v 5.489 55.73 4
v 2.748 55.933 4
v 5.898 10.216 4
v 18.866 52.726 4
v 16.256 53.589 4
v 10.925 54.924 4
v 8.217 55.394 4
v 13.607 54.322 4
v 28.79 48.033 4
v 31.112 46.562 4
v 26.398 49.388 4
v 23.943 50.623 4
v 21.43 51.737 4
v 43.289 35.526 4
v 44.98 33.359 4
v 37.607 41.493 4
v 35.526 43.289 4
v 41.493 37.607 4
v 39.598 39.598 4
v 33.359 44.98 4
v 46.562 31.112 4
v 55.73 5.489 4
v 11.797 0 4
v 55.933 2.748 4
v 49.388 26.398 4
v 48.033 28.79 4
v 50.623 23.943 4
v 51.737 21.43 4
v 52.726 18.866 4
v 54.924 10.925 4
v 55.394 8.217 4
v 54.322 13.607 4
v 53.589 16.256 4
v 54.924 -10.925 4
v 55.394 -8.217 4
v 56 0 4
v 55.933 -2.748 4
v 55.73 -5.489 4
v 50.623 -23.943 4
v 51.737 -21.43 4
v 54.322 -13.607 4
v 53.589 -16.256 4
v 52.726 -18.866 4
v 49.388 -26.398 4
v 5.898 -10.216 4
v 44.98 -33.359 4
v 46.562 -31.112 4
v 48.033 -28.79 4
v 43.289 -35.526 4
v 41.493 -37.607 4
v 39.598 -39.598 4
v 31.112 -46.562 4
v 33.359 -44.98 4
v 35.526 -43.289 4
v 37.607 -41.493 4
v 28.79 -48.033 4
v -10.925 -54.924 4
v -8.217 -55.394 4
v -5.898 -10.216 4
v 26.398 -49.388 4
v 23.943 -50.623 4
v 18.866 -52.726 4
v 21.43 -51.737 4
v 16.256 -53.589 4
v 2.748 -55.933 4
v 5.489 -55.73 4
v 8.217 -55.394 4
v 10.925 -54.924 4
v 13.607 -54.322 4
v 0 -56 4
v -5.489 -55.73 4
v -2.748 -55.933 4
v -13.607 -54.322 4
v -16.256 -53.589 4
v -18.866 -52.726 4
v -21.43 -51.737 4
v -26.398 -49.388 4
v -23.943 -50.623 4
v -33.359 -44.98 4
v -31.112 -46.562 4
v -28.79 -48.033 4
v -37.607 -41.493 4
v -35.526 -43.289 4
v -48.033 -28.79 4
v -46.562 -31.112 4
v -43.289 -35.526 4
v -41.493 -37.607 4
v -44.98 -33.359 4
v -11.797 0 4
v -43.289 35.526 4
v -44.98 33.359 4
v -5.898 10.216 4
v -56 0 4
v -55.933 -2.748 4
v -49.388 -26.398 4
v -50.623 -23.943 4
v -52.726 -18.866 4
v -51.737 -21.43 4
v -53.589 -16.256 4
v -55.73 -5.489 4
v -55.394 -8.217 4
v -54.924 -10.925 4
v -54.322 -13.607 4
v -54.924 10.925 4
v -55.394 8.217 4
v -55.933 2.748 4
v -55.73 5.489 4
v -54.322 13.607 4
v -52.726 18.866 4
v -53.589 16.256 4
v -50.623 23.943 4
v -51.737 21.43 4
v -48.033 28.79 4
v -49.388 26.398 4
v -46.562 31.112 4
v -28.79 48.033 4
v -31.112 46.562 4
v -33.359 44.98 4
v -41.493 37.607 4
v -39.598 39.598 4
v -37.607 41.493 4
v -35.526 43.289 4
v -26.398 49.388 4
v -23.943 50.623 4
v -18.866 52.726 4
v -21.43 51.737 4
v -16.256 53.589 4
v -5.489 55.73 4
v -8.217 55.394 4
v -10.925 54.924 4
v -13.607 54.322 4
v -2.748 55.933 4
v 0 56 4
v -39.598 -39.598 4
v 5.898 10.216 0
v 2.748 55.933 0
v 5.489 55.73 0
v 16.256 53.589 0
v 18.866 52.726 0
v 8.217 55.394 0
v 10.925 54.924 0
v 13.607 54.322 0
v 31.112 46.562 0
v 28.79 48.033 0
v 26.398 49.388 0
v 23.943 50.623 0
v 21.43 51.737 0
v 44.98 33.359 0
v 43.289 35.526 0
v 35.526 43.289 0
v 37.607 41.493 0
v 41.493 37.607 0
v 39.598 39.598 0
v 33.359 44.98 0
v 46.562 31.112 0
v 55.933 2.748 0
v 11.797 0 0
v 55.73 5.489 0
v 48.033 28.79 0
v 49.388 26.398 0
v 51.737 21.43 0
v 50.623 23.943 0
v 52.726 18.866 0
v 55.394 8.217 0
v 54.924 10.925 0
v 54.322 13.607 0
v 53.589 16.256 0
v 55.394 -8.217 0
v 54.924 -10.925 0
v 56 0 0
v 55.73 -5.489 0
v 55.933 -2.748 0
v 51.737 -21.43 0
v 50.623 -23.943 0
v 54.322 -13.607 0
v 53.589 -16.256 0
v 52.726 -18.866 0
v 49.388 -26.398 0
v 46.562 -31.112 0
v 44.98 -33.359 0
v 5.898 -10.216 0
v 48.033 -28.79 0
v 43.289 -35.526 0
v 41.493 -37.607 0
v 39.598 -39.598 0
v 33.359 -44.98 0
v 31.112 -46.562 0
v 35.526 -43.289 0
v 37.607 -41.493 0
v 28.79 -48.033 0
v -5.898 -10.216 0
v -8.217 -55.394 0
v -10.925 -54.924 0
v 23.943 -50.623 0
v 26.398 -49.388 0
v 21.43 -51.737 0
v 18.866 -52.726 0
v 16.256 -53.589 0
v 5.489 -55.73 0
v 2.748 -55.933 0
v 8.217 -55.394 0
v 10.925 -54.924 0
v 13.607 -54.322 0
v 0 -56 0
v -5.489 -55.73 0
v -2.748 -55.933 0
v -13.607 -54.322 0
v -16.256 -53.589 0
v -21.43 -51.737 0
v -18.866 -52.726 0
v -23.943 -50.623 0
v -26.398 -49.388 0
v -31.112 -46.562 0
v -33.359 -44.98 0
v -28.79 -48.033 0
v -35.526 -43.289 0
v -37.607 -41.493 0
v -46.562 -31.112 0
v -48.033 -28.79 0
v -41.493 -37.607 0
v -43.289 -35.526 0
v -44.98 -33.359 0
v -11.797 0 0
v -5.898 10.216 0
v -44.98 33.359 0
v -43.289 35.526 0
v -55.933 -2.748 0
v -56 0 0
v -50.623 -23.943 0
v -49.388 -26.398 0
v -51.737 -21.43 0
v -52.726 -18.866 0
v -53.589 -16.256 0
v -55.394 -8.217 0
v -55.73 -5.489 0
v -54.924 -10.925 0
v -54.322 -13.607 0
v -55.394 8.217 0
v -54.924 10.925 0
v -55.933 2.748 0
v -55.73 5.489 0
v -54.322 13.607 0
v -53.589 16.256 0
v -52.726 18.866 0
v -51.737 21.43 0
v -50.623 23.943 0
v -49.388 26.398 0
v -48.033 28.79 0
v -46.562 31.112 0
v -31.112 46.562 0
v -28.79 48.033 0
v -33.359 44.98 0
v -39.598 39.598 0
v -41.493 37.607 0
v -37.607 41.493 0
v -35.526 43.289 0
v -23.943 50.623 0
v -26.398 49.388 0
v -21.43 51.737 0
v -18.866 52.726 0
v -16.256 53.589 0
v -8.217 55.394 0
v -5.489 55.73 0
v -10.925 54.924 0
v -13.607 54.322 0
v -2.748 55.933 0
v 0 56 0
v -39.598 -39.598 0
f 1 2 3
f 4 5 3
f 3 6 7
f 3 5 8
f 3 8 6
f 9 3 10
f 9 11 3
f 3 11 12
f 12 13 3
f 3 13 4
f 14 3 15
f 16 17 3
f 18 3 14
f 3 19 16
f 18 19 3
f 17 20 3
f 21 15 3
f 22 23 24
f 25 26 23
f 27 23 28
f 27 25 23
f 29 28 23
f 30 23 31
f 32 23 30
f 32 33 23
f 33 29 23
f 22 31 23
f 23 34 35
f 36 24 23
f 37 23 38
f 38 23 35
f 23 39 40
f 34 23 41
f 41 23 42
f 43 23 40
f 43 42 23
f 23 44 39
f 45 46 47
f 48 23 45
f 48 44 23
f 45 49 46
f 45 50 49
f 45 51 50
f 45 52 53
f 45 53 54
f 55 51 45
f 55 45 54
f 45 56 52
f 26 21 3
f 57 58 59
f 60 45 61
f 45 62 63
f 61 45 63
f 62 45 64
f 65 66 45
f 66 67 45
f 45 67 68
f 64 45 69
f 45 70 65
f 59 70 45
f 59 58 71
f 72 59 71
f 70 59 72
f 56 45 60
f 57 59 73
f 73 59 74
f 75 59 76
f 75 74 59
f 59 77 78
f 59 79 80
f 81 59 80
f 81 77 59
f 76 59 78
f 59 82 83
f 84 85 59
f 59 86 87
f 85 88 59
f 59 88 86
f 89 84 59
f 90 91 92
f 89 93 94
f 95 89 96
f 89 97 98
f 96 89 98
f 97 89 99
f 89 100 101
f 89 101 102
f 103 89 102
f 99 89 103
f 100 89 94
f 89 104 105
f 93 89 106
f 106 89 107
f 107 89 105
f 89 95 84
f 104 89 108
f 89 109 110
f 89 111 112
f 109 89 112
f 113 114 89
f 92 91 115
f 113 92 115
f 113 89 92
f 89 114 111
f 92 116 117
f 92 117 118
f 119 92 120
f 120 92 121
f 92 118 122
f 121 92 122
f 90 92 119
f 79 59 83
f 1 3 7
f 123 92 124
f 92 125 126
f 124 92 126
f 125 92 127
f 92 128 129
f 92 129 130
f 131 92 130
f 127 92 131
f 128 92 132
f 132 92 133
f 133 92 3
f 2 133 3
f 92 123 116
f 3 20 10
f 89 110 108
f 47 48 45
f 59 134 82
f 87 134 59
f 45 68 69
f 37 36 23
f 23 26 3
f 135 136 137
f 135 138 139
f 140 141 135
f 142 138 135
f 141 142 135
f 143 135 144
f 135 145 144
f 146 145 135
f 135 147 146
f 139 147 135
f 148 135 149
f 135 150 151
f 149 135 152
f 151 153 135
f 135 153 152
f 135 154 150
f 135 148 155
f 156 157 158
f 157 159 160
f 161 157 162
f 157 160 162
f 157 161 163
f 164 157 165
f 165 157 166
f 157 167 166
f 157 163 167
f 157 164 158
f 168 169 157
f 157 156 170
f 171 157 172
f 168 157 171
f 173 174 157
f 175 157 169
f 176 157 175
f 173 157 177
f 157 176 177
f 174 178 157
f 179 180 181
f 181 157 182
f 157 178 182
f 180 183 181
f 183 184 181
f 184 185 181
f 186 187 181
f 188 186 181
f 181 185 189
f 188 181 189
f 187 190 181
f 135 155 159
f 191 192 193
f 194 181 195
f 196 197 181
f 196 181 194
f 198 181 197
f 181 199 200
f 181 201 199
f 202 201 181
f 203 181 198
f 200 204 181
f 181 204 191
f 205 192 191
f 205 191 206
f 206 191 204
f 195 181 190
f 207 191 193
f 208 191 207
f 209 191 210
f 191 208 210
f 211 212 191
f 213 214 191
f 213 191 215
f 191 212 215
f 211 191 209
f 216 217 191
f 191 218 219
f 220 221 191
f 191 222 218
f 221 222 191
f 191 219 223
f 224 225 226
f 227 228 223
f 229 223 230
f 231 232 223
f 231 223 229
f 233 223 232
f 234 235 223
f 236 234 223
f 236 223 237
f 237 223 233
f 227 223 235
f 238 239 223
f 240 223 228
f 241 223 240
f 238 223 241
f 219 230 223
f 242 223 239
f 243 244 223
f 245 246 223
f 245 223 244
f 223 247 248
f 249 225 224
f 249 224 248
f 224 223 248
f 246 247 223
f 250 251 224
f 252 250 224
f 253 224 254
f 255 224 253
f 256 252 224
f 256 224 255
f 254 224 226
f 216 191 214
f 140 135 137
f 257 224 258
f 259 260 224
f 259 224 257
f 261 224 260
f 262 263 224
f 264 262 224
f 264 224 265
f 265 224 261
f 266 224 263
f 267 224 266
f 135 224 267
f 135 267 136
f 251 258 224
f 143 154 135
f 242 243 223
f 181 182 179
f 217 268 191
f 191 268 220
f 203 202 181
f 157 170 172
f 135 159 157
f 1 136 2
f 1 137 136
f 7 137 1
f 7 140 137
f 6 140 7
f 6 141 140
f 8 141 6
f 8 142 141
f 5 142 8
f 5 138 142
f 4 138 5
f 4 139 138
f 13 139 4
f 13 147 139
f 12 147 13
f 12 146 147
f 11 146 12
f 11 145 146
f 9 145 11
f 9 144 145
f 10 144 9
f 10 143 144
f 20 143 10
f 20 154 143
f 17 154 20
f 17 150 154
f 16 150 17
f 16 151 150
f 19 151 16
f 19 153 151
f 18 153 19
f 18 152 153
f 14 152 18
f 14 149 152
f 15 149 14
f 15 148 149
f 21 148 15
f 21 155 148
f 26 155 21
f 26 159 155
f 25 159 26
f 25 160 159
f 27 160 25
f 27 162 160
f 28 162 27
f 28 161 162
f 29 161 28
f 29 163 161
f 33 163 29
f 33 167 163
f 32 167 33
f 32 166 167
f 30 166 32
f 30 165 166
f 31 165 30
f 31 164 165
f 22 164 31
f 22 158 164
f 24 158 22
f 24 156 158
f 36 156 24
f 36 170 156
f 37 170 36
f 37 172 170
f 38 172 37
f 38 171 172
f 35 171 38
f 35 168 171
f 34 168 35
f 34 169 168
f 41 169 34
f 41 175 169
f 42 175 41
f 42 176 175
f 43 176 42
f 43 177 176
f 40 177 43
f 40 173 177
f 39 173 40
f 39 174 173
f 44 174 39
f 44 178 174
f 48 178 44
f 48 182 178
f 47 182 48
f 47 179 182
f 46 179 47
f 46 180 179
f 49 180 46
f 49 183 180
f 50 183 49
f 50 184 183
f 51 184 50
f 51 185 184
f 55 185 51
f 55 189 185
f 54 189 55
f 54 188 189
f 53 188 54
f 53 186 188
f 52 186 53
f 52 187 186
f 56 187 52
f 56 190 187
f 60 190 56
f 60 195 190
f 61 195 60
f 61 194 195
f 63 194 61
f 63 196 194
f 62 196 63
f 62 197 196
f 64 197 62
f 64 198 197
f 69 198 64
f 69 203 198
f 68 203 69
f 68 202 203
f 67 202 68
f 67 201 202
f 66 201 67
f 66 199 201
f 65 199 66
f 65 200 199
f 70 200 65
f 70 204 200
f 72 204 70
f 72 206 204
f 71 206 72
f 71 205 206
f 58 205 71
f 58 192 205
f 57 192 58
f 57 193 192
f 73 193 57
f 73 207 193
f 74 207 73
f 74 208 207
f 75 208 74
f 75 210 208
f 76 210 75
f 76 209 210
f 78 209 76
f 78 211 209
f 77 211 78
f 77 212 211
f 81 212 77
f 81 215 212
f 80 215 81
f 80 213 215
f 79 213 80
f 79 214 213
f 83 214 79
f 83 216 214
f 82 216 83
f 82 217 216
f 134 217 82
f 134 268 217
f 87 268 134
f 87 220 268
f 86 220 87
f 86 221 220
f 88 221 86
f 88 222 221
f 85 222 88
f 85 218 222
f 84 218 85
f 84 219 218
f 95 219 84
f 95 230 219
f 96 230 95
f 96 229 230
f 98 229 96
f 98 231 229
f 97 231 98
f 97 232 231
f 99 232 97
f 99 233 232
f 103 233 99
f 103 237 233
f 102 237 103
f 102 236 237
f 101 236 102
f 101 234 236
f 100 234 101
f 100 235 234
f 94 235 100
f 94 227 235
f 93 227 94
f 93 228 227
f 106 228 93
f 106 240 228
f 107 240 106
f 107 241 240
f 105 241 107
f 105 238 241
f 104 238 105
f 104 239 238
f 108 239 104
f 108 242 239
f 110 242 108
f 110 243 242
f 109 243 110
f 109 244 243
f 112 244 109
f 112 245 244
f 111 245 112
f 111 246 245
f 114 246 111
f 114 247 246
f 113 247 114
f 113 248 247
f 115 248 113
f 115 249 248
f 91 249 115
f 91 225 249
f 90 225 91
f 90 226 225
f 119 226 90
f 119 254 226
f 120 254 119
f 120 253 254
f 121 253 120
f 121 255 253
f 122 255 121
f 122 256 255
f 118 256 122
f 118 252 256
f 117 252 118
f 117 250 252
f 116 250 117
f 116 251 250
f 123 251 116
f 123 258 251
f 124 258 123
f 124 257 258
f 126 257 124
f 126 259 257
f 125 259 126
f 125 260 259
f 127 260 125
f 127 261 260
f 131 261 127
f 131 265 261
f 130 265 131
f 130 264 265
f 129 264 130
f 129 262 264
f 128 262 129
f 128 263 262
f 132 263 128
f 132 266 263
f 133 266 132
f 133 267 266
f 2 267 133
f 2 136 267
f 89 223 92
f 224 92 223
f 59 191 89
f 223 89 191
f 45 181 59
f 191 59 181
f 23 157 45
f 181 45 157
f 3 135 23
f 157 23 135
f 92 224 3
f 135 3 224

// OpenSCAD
include <../lib/meshtastic-drybag-node-lib.scad>;
$fn = 40;
reel_flange_print();
